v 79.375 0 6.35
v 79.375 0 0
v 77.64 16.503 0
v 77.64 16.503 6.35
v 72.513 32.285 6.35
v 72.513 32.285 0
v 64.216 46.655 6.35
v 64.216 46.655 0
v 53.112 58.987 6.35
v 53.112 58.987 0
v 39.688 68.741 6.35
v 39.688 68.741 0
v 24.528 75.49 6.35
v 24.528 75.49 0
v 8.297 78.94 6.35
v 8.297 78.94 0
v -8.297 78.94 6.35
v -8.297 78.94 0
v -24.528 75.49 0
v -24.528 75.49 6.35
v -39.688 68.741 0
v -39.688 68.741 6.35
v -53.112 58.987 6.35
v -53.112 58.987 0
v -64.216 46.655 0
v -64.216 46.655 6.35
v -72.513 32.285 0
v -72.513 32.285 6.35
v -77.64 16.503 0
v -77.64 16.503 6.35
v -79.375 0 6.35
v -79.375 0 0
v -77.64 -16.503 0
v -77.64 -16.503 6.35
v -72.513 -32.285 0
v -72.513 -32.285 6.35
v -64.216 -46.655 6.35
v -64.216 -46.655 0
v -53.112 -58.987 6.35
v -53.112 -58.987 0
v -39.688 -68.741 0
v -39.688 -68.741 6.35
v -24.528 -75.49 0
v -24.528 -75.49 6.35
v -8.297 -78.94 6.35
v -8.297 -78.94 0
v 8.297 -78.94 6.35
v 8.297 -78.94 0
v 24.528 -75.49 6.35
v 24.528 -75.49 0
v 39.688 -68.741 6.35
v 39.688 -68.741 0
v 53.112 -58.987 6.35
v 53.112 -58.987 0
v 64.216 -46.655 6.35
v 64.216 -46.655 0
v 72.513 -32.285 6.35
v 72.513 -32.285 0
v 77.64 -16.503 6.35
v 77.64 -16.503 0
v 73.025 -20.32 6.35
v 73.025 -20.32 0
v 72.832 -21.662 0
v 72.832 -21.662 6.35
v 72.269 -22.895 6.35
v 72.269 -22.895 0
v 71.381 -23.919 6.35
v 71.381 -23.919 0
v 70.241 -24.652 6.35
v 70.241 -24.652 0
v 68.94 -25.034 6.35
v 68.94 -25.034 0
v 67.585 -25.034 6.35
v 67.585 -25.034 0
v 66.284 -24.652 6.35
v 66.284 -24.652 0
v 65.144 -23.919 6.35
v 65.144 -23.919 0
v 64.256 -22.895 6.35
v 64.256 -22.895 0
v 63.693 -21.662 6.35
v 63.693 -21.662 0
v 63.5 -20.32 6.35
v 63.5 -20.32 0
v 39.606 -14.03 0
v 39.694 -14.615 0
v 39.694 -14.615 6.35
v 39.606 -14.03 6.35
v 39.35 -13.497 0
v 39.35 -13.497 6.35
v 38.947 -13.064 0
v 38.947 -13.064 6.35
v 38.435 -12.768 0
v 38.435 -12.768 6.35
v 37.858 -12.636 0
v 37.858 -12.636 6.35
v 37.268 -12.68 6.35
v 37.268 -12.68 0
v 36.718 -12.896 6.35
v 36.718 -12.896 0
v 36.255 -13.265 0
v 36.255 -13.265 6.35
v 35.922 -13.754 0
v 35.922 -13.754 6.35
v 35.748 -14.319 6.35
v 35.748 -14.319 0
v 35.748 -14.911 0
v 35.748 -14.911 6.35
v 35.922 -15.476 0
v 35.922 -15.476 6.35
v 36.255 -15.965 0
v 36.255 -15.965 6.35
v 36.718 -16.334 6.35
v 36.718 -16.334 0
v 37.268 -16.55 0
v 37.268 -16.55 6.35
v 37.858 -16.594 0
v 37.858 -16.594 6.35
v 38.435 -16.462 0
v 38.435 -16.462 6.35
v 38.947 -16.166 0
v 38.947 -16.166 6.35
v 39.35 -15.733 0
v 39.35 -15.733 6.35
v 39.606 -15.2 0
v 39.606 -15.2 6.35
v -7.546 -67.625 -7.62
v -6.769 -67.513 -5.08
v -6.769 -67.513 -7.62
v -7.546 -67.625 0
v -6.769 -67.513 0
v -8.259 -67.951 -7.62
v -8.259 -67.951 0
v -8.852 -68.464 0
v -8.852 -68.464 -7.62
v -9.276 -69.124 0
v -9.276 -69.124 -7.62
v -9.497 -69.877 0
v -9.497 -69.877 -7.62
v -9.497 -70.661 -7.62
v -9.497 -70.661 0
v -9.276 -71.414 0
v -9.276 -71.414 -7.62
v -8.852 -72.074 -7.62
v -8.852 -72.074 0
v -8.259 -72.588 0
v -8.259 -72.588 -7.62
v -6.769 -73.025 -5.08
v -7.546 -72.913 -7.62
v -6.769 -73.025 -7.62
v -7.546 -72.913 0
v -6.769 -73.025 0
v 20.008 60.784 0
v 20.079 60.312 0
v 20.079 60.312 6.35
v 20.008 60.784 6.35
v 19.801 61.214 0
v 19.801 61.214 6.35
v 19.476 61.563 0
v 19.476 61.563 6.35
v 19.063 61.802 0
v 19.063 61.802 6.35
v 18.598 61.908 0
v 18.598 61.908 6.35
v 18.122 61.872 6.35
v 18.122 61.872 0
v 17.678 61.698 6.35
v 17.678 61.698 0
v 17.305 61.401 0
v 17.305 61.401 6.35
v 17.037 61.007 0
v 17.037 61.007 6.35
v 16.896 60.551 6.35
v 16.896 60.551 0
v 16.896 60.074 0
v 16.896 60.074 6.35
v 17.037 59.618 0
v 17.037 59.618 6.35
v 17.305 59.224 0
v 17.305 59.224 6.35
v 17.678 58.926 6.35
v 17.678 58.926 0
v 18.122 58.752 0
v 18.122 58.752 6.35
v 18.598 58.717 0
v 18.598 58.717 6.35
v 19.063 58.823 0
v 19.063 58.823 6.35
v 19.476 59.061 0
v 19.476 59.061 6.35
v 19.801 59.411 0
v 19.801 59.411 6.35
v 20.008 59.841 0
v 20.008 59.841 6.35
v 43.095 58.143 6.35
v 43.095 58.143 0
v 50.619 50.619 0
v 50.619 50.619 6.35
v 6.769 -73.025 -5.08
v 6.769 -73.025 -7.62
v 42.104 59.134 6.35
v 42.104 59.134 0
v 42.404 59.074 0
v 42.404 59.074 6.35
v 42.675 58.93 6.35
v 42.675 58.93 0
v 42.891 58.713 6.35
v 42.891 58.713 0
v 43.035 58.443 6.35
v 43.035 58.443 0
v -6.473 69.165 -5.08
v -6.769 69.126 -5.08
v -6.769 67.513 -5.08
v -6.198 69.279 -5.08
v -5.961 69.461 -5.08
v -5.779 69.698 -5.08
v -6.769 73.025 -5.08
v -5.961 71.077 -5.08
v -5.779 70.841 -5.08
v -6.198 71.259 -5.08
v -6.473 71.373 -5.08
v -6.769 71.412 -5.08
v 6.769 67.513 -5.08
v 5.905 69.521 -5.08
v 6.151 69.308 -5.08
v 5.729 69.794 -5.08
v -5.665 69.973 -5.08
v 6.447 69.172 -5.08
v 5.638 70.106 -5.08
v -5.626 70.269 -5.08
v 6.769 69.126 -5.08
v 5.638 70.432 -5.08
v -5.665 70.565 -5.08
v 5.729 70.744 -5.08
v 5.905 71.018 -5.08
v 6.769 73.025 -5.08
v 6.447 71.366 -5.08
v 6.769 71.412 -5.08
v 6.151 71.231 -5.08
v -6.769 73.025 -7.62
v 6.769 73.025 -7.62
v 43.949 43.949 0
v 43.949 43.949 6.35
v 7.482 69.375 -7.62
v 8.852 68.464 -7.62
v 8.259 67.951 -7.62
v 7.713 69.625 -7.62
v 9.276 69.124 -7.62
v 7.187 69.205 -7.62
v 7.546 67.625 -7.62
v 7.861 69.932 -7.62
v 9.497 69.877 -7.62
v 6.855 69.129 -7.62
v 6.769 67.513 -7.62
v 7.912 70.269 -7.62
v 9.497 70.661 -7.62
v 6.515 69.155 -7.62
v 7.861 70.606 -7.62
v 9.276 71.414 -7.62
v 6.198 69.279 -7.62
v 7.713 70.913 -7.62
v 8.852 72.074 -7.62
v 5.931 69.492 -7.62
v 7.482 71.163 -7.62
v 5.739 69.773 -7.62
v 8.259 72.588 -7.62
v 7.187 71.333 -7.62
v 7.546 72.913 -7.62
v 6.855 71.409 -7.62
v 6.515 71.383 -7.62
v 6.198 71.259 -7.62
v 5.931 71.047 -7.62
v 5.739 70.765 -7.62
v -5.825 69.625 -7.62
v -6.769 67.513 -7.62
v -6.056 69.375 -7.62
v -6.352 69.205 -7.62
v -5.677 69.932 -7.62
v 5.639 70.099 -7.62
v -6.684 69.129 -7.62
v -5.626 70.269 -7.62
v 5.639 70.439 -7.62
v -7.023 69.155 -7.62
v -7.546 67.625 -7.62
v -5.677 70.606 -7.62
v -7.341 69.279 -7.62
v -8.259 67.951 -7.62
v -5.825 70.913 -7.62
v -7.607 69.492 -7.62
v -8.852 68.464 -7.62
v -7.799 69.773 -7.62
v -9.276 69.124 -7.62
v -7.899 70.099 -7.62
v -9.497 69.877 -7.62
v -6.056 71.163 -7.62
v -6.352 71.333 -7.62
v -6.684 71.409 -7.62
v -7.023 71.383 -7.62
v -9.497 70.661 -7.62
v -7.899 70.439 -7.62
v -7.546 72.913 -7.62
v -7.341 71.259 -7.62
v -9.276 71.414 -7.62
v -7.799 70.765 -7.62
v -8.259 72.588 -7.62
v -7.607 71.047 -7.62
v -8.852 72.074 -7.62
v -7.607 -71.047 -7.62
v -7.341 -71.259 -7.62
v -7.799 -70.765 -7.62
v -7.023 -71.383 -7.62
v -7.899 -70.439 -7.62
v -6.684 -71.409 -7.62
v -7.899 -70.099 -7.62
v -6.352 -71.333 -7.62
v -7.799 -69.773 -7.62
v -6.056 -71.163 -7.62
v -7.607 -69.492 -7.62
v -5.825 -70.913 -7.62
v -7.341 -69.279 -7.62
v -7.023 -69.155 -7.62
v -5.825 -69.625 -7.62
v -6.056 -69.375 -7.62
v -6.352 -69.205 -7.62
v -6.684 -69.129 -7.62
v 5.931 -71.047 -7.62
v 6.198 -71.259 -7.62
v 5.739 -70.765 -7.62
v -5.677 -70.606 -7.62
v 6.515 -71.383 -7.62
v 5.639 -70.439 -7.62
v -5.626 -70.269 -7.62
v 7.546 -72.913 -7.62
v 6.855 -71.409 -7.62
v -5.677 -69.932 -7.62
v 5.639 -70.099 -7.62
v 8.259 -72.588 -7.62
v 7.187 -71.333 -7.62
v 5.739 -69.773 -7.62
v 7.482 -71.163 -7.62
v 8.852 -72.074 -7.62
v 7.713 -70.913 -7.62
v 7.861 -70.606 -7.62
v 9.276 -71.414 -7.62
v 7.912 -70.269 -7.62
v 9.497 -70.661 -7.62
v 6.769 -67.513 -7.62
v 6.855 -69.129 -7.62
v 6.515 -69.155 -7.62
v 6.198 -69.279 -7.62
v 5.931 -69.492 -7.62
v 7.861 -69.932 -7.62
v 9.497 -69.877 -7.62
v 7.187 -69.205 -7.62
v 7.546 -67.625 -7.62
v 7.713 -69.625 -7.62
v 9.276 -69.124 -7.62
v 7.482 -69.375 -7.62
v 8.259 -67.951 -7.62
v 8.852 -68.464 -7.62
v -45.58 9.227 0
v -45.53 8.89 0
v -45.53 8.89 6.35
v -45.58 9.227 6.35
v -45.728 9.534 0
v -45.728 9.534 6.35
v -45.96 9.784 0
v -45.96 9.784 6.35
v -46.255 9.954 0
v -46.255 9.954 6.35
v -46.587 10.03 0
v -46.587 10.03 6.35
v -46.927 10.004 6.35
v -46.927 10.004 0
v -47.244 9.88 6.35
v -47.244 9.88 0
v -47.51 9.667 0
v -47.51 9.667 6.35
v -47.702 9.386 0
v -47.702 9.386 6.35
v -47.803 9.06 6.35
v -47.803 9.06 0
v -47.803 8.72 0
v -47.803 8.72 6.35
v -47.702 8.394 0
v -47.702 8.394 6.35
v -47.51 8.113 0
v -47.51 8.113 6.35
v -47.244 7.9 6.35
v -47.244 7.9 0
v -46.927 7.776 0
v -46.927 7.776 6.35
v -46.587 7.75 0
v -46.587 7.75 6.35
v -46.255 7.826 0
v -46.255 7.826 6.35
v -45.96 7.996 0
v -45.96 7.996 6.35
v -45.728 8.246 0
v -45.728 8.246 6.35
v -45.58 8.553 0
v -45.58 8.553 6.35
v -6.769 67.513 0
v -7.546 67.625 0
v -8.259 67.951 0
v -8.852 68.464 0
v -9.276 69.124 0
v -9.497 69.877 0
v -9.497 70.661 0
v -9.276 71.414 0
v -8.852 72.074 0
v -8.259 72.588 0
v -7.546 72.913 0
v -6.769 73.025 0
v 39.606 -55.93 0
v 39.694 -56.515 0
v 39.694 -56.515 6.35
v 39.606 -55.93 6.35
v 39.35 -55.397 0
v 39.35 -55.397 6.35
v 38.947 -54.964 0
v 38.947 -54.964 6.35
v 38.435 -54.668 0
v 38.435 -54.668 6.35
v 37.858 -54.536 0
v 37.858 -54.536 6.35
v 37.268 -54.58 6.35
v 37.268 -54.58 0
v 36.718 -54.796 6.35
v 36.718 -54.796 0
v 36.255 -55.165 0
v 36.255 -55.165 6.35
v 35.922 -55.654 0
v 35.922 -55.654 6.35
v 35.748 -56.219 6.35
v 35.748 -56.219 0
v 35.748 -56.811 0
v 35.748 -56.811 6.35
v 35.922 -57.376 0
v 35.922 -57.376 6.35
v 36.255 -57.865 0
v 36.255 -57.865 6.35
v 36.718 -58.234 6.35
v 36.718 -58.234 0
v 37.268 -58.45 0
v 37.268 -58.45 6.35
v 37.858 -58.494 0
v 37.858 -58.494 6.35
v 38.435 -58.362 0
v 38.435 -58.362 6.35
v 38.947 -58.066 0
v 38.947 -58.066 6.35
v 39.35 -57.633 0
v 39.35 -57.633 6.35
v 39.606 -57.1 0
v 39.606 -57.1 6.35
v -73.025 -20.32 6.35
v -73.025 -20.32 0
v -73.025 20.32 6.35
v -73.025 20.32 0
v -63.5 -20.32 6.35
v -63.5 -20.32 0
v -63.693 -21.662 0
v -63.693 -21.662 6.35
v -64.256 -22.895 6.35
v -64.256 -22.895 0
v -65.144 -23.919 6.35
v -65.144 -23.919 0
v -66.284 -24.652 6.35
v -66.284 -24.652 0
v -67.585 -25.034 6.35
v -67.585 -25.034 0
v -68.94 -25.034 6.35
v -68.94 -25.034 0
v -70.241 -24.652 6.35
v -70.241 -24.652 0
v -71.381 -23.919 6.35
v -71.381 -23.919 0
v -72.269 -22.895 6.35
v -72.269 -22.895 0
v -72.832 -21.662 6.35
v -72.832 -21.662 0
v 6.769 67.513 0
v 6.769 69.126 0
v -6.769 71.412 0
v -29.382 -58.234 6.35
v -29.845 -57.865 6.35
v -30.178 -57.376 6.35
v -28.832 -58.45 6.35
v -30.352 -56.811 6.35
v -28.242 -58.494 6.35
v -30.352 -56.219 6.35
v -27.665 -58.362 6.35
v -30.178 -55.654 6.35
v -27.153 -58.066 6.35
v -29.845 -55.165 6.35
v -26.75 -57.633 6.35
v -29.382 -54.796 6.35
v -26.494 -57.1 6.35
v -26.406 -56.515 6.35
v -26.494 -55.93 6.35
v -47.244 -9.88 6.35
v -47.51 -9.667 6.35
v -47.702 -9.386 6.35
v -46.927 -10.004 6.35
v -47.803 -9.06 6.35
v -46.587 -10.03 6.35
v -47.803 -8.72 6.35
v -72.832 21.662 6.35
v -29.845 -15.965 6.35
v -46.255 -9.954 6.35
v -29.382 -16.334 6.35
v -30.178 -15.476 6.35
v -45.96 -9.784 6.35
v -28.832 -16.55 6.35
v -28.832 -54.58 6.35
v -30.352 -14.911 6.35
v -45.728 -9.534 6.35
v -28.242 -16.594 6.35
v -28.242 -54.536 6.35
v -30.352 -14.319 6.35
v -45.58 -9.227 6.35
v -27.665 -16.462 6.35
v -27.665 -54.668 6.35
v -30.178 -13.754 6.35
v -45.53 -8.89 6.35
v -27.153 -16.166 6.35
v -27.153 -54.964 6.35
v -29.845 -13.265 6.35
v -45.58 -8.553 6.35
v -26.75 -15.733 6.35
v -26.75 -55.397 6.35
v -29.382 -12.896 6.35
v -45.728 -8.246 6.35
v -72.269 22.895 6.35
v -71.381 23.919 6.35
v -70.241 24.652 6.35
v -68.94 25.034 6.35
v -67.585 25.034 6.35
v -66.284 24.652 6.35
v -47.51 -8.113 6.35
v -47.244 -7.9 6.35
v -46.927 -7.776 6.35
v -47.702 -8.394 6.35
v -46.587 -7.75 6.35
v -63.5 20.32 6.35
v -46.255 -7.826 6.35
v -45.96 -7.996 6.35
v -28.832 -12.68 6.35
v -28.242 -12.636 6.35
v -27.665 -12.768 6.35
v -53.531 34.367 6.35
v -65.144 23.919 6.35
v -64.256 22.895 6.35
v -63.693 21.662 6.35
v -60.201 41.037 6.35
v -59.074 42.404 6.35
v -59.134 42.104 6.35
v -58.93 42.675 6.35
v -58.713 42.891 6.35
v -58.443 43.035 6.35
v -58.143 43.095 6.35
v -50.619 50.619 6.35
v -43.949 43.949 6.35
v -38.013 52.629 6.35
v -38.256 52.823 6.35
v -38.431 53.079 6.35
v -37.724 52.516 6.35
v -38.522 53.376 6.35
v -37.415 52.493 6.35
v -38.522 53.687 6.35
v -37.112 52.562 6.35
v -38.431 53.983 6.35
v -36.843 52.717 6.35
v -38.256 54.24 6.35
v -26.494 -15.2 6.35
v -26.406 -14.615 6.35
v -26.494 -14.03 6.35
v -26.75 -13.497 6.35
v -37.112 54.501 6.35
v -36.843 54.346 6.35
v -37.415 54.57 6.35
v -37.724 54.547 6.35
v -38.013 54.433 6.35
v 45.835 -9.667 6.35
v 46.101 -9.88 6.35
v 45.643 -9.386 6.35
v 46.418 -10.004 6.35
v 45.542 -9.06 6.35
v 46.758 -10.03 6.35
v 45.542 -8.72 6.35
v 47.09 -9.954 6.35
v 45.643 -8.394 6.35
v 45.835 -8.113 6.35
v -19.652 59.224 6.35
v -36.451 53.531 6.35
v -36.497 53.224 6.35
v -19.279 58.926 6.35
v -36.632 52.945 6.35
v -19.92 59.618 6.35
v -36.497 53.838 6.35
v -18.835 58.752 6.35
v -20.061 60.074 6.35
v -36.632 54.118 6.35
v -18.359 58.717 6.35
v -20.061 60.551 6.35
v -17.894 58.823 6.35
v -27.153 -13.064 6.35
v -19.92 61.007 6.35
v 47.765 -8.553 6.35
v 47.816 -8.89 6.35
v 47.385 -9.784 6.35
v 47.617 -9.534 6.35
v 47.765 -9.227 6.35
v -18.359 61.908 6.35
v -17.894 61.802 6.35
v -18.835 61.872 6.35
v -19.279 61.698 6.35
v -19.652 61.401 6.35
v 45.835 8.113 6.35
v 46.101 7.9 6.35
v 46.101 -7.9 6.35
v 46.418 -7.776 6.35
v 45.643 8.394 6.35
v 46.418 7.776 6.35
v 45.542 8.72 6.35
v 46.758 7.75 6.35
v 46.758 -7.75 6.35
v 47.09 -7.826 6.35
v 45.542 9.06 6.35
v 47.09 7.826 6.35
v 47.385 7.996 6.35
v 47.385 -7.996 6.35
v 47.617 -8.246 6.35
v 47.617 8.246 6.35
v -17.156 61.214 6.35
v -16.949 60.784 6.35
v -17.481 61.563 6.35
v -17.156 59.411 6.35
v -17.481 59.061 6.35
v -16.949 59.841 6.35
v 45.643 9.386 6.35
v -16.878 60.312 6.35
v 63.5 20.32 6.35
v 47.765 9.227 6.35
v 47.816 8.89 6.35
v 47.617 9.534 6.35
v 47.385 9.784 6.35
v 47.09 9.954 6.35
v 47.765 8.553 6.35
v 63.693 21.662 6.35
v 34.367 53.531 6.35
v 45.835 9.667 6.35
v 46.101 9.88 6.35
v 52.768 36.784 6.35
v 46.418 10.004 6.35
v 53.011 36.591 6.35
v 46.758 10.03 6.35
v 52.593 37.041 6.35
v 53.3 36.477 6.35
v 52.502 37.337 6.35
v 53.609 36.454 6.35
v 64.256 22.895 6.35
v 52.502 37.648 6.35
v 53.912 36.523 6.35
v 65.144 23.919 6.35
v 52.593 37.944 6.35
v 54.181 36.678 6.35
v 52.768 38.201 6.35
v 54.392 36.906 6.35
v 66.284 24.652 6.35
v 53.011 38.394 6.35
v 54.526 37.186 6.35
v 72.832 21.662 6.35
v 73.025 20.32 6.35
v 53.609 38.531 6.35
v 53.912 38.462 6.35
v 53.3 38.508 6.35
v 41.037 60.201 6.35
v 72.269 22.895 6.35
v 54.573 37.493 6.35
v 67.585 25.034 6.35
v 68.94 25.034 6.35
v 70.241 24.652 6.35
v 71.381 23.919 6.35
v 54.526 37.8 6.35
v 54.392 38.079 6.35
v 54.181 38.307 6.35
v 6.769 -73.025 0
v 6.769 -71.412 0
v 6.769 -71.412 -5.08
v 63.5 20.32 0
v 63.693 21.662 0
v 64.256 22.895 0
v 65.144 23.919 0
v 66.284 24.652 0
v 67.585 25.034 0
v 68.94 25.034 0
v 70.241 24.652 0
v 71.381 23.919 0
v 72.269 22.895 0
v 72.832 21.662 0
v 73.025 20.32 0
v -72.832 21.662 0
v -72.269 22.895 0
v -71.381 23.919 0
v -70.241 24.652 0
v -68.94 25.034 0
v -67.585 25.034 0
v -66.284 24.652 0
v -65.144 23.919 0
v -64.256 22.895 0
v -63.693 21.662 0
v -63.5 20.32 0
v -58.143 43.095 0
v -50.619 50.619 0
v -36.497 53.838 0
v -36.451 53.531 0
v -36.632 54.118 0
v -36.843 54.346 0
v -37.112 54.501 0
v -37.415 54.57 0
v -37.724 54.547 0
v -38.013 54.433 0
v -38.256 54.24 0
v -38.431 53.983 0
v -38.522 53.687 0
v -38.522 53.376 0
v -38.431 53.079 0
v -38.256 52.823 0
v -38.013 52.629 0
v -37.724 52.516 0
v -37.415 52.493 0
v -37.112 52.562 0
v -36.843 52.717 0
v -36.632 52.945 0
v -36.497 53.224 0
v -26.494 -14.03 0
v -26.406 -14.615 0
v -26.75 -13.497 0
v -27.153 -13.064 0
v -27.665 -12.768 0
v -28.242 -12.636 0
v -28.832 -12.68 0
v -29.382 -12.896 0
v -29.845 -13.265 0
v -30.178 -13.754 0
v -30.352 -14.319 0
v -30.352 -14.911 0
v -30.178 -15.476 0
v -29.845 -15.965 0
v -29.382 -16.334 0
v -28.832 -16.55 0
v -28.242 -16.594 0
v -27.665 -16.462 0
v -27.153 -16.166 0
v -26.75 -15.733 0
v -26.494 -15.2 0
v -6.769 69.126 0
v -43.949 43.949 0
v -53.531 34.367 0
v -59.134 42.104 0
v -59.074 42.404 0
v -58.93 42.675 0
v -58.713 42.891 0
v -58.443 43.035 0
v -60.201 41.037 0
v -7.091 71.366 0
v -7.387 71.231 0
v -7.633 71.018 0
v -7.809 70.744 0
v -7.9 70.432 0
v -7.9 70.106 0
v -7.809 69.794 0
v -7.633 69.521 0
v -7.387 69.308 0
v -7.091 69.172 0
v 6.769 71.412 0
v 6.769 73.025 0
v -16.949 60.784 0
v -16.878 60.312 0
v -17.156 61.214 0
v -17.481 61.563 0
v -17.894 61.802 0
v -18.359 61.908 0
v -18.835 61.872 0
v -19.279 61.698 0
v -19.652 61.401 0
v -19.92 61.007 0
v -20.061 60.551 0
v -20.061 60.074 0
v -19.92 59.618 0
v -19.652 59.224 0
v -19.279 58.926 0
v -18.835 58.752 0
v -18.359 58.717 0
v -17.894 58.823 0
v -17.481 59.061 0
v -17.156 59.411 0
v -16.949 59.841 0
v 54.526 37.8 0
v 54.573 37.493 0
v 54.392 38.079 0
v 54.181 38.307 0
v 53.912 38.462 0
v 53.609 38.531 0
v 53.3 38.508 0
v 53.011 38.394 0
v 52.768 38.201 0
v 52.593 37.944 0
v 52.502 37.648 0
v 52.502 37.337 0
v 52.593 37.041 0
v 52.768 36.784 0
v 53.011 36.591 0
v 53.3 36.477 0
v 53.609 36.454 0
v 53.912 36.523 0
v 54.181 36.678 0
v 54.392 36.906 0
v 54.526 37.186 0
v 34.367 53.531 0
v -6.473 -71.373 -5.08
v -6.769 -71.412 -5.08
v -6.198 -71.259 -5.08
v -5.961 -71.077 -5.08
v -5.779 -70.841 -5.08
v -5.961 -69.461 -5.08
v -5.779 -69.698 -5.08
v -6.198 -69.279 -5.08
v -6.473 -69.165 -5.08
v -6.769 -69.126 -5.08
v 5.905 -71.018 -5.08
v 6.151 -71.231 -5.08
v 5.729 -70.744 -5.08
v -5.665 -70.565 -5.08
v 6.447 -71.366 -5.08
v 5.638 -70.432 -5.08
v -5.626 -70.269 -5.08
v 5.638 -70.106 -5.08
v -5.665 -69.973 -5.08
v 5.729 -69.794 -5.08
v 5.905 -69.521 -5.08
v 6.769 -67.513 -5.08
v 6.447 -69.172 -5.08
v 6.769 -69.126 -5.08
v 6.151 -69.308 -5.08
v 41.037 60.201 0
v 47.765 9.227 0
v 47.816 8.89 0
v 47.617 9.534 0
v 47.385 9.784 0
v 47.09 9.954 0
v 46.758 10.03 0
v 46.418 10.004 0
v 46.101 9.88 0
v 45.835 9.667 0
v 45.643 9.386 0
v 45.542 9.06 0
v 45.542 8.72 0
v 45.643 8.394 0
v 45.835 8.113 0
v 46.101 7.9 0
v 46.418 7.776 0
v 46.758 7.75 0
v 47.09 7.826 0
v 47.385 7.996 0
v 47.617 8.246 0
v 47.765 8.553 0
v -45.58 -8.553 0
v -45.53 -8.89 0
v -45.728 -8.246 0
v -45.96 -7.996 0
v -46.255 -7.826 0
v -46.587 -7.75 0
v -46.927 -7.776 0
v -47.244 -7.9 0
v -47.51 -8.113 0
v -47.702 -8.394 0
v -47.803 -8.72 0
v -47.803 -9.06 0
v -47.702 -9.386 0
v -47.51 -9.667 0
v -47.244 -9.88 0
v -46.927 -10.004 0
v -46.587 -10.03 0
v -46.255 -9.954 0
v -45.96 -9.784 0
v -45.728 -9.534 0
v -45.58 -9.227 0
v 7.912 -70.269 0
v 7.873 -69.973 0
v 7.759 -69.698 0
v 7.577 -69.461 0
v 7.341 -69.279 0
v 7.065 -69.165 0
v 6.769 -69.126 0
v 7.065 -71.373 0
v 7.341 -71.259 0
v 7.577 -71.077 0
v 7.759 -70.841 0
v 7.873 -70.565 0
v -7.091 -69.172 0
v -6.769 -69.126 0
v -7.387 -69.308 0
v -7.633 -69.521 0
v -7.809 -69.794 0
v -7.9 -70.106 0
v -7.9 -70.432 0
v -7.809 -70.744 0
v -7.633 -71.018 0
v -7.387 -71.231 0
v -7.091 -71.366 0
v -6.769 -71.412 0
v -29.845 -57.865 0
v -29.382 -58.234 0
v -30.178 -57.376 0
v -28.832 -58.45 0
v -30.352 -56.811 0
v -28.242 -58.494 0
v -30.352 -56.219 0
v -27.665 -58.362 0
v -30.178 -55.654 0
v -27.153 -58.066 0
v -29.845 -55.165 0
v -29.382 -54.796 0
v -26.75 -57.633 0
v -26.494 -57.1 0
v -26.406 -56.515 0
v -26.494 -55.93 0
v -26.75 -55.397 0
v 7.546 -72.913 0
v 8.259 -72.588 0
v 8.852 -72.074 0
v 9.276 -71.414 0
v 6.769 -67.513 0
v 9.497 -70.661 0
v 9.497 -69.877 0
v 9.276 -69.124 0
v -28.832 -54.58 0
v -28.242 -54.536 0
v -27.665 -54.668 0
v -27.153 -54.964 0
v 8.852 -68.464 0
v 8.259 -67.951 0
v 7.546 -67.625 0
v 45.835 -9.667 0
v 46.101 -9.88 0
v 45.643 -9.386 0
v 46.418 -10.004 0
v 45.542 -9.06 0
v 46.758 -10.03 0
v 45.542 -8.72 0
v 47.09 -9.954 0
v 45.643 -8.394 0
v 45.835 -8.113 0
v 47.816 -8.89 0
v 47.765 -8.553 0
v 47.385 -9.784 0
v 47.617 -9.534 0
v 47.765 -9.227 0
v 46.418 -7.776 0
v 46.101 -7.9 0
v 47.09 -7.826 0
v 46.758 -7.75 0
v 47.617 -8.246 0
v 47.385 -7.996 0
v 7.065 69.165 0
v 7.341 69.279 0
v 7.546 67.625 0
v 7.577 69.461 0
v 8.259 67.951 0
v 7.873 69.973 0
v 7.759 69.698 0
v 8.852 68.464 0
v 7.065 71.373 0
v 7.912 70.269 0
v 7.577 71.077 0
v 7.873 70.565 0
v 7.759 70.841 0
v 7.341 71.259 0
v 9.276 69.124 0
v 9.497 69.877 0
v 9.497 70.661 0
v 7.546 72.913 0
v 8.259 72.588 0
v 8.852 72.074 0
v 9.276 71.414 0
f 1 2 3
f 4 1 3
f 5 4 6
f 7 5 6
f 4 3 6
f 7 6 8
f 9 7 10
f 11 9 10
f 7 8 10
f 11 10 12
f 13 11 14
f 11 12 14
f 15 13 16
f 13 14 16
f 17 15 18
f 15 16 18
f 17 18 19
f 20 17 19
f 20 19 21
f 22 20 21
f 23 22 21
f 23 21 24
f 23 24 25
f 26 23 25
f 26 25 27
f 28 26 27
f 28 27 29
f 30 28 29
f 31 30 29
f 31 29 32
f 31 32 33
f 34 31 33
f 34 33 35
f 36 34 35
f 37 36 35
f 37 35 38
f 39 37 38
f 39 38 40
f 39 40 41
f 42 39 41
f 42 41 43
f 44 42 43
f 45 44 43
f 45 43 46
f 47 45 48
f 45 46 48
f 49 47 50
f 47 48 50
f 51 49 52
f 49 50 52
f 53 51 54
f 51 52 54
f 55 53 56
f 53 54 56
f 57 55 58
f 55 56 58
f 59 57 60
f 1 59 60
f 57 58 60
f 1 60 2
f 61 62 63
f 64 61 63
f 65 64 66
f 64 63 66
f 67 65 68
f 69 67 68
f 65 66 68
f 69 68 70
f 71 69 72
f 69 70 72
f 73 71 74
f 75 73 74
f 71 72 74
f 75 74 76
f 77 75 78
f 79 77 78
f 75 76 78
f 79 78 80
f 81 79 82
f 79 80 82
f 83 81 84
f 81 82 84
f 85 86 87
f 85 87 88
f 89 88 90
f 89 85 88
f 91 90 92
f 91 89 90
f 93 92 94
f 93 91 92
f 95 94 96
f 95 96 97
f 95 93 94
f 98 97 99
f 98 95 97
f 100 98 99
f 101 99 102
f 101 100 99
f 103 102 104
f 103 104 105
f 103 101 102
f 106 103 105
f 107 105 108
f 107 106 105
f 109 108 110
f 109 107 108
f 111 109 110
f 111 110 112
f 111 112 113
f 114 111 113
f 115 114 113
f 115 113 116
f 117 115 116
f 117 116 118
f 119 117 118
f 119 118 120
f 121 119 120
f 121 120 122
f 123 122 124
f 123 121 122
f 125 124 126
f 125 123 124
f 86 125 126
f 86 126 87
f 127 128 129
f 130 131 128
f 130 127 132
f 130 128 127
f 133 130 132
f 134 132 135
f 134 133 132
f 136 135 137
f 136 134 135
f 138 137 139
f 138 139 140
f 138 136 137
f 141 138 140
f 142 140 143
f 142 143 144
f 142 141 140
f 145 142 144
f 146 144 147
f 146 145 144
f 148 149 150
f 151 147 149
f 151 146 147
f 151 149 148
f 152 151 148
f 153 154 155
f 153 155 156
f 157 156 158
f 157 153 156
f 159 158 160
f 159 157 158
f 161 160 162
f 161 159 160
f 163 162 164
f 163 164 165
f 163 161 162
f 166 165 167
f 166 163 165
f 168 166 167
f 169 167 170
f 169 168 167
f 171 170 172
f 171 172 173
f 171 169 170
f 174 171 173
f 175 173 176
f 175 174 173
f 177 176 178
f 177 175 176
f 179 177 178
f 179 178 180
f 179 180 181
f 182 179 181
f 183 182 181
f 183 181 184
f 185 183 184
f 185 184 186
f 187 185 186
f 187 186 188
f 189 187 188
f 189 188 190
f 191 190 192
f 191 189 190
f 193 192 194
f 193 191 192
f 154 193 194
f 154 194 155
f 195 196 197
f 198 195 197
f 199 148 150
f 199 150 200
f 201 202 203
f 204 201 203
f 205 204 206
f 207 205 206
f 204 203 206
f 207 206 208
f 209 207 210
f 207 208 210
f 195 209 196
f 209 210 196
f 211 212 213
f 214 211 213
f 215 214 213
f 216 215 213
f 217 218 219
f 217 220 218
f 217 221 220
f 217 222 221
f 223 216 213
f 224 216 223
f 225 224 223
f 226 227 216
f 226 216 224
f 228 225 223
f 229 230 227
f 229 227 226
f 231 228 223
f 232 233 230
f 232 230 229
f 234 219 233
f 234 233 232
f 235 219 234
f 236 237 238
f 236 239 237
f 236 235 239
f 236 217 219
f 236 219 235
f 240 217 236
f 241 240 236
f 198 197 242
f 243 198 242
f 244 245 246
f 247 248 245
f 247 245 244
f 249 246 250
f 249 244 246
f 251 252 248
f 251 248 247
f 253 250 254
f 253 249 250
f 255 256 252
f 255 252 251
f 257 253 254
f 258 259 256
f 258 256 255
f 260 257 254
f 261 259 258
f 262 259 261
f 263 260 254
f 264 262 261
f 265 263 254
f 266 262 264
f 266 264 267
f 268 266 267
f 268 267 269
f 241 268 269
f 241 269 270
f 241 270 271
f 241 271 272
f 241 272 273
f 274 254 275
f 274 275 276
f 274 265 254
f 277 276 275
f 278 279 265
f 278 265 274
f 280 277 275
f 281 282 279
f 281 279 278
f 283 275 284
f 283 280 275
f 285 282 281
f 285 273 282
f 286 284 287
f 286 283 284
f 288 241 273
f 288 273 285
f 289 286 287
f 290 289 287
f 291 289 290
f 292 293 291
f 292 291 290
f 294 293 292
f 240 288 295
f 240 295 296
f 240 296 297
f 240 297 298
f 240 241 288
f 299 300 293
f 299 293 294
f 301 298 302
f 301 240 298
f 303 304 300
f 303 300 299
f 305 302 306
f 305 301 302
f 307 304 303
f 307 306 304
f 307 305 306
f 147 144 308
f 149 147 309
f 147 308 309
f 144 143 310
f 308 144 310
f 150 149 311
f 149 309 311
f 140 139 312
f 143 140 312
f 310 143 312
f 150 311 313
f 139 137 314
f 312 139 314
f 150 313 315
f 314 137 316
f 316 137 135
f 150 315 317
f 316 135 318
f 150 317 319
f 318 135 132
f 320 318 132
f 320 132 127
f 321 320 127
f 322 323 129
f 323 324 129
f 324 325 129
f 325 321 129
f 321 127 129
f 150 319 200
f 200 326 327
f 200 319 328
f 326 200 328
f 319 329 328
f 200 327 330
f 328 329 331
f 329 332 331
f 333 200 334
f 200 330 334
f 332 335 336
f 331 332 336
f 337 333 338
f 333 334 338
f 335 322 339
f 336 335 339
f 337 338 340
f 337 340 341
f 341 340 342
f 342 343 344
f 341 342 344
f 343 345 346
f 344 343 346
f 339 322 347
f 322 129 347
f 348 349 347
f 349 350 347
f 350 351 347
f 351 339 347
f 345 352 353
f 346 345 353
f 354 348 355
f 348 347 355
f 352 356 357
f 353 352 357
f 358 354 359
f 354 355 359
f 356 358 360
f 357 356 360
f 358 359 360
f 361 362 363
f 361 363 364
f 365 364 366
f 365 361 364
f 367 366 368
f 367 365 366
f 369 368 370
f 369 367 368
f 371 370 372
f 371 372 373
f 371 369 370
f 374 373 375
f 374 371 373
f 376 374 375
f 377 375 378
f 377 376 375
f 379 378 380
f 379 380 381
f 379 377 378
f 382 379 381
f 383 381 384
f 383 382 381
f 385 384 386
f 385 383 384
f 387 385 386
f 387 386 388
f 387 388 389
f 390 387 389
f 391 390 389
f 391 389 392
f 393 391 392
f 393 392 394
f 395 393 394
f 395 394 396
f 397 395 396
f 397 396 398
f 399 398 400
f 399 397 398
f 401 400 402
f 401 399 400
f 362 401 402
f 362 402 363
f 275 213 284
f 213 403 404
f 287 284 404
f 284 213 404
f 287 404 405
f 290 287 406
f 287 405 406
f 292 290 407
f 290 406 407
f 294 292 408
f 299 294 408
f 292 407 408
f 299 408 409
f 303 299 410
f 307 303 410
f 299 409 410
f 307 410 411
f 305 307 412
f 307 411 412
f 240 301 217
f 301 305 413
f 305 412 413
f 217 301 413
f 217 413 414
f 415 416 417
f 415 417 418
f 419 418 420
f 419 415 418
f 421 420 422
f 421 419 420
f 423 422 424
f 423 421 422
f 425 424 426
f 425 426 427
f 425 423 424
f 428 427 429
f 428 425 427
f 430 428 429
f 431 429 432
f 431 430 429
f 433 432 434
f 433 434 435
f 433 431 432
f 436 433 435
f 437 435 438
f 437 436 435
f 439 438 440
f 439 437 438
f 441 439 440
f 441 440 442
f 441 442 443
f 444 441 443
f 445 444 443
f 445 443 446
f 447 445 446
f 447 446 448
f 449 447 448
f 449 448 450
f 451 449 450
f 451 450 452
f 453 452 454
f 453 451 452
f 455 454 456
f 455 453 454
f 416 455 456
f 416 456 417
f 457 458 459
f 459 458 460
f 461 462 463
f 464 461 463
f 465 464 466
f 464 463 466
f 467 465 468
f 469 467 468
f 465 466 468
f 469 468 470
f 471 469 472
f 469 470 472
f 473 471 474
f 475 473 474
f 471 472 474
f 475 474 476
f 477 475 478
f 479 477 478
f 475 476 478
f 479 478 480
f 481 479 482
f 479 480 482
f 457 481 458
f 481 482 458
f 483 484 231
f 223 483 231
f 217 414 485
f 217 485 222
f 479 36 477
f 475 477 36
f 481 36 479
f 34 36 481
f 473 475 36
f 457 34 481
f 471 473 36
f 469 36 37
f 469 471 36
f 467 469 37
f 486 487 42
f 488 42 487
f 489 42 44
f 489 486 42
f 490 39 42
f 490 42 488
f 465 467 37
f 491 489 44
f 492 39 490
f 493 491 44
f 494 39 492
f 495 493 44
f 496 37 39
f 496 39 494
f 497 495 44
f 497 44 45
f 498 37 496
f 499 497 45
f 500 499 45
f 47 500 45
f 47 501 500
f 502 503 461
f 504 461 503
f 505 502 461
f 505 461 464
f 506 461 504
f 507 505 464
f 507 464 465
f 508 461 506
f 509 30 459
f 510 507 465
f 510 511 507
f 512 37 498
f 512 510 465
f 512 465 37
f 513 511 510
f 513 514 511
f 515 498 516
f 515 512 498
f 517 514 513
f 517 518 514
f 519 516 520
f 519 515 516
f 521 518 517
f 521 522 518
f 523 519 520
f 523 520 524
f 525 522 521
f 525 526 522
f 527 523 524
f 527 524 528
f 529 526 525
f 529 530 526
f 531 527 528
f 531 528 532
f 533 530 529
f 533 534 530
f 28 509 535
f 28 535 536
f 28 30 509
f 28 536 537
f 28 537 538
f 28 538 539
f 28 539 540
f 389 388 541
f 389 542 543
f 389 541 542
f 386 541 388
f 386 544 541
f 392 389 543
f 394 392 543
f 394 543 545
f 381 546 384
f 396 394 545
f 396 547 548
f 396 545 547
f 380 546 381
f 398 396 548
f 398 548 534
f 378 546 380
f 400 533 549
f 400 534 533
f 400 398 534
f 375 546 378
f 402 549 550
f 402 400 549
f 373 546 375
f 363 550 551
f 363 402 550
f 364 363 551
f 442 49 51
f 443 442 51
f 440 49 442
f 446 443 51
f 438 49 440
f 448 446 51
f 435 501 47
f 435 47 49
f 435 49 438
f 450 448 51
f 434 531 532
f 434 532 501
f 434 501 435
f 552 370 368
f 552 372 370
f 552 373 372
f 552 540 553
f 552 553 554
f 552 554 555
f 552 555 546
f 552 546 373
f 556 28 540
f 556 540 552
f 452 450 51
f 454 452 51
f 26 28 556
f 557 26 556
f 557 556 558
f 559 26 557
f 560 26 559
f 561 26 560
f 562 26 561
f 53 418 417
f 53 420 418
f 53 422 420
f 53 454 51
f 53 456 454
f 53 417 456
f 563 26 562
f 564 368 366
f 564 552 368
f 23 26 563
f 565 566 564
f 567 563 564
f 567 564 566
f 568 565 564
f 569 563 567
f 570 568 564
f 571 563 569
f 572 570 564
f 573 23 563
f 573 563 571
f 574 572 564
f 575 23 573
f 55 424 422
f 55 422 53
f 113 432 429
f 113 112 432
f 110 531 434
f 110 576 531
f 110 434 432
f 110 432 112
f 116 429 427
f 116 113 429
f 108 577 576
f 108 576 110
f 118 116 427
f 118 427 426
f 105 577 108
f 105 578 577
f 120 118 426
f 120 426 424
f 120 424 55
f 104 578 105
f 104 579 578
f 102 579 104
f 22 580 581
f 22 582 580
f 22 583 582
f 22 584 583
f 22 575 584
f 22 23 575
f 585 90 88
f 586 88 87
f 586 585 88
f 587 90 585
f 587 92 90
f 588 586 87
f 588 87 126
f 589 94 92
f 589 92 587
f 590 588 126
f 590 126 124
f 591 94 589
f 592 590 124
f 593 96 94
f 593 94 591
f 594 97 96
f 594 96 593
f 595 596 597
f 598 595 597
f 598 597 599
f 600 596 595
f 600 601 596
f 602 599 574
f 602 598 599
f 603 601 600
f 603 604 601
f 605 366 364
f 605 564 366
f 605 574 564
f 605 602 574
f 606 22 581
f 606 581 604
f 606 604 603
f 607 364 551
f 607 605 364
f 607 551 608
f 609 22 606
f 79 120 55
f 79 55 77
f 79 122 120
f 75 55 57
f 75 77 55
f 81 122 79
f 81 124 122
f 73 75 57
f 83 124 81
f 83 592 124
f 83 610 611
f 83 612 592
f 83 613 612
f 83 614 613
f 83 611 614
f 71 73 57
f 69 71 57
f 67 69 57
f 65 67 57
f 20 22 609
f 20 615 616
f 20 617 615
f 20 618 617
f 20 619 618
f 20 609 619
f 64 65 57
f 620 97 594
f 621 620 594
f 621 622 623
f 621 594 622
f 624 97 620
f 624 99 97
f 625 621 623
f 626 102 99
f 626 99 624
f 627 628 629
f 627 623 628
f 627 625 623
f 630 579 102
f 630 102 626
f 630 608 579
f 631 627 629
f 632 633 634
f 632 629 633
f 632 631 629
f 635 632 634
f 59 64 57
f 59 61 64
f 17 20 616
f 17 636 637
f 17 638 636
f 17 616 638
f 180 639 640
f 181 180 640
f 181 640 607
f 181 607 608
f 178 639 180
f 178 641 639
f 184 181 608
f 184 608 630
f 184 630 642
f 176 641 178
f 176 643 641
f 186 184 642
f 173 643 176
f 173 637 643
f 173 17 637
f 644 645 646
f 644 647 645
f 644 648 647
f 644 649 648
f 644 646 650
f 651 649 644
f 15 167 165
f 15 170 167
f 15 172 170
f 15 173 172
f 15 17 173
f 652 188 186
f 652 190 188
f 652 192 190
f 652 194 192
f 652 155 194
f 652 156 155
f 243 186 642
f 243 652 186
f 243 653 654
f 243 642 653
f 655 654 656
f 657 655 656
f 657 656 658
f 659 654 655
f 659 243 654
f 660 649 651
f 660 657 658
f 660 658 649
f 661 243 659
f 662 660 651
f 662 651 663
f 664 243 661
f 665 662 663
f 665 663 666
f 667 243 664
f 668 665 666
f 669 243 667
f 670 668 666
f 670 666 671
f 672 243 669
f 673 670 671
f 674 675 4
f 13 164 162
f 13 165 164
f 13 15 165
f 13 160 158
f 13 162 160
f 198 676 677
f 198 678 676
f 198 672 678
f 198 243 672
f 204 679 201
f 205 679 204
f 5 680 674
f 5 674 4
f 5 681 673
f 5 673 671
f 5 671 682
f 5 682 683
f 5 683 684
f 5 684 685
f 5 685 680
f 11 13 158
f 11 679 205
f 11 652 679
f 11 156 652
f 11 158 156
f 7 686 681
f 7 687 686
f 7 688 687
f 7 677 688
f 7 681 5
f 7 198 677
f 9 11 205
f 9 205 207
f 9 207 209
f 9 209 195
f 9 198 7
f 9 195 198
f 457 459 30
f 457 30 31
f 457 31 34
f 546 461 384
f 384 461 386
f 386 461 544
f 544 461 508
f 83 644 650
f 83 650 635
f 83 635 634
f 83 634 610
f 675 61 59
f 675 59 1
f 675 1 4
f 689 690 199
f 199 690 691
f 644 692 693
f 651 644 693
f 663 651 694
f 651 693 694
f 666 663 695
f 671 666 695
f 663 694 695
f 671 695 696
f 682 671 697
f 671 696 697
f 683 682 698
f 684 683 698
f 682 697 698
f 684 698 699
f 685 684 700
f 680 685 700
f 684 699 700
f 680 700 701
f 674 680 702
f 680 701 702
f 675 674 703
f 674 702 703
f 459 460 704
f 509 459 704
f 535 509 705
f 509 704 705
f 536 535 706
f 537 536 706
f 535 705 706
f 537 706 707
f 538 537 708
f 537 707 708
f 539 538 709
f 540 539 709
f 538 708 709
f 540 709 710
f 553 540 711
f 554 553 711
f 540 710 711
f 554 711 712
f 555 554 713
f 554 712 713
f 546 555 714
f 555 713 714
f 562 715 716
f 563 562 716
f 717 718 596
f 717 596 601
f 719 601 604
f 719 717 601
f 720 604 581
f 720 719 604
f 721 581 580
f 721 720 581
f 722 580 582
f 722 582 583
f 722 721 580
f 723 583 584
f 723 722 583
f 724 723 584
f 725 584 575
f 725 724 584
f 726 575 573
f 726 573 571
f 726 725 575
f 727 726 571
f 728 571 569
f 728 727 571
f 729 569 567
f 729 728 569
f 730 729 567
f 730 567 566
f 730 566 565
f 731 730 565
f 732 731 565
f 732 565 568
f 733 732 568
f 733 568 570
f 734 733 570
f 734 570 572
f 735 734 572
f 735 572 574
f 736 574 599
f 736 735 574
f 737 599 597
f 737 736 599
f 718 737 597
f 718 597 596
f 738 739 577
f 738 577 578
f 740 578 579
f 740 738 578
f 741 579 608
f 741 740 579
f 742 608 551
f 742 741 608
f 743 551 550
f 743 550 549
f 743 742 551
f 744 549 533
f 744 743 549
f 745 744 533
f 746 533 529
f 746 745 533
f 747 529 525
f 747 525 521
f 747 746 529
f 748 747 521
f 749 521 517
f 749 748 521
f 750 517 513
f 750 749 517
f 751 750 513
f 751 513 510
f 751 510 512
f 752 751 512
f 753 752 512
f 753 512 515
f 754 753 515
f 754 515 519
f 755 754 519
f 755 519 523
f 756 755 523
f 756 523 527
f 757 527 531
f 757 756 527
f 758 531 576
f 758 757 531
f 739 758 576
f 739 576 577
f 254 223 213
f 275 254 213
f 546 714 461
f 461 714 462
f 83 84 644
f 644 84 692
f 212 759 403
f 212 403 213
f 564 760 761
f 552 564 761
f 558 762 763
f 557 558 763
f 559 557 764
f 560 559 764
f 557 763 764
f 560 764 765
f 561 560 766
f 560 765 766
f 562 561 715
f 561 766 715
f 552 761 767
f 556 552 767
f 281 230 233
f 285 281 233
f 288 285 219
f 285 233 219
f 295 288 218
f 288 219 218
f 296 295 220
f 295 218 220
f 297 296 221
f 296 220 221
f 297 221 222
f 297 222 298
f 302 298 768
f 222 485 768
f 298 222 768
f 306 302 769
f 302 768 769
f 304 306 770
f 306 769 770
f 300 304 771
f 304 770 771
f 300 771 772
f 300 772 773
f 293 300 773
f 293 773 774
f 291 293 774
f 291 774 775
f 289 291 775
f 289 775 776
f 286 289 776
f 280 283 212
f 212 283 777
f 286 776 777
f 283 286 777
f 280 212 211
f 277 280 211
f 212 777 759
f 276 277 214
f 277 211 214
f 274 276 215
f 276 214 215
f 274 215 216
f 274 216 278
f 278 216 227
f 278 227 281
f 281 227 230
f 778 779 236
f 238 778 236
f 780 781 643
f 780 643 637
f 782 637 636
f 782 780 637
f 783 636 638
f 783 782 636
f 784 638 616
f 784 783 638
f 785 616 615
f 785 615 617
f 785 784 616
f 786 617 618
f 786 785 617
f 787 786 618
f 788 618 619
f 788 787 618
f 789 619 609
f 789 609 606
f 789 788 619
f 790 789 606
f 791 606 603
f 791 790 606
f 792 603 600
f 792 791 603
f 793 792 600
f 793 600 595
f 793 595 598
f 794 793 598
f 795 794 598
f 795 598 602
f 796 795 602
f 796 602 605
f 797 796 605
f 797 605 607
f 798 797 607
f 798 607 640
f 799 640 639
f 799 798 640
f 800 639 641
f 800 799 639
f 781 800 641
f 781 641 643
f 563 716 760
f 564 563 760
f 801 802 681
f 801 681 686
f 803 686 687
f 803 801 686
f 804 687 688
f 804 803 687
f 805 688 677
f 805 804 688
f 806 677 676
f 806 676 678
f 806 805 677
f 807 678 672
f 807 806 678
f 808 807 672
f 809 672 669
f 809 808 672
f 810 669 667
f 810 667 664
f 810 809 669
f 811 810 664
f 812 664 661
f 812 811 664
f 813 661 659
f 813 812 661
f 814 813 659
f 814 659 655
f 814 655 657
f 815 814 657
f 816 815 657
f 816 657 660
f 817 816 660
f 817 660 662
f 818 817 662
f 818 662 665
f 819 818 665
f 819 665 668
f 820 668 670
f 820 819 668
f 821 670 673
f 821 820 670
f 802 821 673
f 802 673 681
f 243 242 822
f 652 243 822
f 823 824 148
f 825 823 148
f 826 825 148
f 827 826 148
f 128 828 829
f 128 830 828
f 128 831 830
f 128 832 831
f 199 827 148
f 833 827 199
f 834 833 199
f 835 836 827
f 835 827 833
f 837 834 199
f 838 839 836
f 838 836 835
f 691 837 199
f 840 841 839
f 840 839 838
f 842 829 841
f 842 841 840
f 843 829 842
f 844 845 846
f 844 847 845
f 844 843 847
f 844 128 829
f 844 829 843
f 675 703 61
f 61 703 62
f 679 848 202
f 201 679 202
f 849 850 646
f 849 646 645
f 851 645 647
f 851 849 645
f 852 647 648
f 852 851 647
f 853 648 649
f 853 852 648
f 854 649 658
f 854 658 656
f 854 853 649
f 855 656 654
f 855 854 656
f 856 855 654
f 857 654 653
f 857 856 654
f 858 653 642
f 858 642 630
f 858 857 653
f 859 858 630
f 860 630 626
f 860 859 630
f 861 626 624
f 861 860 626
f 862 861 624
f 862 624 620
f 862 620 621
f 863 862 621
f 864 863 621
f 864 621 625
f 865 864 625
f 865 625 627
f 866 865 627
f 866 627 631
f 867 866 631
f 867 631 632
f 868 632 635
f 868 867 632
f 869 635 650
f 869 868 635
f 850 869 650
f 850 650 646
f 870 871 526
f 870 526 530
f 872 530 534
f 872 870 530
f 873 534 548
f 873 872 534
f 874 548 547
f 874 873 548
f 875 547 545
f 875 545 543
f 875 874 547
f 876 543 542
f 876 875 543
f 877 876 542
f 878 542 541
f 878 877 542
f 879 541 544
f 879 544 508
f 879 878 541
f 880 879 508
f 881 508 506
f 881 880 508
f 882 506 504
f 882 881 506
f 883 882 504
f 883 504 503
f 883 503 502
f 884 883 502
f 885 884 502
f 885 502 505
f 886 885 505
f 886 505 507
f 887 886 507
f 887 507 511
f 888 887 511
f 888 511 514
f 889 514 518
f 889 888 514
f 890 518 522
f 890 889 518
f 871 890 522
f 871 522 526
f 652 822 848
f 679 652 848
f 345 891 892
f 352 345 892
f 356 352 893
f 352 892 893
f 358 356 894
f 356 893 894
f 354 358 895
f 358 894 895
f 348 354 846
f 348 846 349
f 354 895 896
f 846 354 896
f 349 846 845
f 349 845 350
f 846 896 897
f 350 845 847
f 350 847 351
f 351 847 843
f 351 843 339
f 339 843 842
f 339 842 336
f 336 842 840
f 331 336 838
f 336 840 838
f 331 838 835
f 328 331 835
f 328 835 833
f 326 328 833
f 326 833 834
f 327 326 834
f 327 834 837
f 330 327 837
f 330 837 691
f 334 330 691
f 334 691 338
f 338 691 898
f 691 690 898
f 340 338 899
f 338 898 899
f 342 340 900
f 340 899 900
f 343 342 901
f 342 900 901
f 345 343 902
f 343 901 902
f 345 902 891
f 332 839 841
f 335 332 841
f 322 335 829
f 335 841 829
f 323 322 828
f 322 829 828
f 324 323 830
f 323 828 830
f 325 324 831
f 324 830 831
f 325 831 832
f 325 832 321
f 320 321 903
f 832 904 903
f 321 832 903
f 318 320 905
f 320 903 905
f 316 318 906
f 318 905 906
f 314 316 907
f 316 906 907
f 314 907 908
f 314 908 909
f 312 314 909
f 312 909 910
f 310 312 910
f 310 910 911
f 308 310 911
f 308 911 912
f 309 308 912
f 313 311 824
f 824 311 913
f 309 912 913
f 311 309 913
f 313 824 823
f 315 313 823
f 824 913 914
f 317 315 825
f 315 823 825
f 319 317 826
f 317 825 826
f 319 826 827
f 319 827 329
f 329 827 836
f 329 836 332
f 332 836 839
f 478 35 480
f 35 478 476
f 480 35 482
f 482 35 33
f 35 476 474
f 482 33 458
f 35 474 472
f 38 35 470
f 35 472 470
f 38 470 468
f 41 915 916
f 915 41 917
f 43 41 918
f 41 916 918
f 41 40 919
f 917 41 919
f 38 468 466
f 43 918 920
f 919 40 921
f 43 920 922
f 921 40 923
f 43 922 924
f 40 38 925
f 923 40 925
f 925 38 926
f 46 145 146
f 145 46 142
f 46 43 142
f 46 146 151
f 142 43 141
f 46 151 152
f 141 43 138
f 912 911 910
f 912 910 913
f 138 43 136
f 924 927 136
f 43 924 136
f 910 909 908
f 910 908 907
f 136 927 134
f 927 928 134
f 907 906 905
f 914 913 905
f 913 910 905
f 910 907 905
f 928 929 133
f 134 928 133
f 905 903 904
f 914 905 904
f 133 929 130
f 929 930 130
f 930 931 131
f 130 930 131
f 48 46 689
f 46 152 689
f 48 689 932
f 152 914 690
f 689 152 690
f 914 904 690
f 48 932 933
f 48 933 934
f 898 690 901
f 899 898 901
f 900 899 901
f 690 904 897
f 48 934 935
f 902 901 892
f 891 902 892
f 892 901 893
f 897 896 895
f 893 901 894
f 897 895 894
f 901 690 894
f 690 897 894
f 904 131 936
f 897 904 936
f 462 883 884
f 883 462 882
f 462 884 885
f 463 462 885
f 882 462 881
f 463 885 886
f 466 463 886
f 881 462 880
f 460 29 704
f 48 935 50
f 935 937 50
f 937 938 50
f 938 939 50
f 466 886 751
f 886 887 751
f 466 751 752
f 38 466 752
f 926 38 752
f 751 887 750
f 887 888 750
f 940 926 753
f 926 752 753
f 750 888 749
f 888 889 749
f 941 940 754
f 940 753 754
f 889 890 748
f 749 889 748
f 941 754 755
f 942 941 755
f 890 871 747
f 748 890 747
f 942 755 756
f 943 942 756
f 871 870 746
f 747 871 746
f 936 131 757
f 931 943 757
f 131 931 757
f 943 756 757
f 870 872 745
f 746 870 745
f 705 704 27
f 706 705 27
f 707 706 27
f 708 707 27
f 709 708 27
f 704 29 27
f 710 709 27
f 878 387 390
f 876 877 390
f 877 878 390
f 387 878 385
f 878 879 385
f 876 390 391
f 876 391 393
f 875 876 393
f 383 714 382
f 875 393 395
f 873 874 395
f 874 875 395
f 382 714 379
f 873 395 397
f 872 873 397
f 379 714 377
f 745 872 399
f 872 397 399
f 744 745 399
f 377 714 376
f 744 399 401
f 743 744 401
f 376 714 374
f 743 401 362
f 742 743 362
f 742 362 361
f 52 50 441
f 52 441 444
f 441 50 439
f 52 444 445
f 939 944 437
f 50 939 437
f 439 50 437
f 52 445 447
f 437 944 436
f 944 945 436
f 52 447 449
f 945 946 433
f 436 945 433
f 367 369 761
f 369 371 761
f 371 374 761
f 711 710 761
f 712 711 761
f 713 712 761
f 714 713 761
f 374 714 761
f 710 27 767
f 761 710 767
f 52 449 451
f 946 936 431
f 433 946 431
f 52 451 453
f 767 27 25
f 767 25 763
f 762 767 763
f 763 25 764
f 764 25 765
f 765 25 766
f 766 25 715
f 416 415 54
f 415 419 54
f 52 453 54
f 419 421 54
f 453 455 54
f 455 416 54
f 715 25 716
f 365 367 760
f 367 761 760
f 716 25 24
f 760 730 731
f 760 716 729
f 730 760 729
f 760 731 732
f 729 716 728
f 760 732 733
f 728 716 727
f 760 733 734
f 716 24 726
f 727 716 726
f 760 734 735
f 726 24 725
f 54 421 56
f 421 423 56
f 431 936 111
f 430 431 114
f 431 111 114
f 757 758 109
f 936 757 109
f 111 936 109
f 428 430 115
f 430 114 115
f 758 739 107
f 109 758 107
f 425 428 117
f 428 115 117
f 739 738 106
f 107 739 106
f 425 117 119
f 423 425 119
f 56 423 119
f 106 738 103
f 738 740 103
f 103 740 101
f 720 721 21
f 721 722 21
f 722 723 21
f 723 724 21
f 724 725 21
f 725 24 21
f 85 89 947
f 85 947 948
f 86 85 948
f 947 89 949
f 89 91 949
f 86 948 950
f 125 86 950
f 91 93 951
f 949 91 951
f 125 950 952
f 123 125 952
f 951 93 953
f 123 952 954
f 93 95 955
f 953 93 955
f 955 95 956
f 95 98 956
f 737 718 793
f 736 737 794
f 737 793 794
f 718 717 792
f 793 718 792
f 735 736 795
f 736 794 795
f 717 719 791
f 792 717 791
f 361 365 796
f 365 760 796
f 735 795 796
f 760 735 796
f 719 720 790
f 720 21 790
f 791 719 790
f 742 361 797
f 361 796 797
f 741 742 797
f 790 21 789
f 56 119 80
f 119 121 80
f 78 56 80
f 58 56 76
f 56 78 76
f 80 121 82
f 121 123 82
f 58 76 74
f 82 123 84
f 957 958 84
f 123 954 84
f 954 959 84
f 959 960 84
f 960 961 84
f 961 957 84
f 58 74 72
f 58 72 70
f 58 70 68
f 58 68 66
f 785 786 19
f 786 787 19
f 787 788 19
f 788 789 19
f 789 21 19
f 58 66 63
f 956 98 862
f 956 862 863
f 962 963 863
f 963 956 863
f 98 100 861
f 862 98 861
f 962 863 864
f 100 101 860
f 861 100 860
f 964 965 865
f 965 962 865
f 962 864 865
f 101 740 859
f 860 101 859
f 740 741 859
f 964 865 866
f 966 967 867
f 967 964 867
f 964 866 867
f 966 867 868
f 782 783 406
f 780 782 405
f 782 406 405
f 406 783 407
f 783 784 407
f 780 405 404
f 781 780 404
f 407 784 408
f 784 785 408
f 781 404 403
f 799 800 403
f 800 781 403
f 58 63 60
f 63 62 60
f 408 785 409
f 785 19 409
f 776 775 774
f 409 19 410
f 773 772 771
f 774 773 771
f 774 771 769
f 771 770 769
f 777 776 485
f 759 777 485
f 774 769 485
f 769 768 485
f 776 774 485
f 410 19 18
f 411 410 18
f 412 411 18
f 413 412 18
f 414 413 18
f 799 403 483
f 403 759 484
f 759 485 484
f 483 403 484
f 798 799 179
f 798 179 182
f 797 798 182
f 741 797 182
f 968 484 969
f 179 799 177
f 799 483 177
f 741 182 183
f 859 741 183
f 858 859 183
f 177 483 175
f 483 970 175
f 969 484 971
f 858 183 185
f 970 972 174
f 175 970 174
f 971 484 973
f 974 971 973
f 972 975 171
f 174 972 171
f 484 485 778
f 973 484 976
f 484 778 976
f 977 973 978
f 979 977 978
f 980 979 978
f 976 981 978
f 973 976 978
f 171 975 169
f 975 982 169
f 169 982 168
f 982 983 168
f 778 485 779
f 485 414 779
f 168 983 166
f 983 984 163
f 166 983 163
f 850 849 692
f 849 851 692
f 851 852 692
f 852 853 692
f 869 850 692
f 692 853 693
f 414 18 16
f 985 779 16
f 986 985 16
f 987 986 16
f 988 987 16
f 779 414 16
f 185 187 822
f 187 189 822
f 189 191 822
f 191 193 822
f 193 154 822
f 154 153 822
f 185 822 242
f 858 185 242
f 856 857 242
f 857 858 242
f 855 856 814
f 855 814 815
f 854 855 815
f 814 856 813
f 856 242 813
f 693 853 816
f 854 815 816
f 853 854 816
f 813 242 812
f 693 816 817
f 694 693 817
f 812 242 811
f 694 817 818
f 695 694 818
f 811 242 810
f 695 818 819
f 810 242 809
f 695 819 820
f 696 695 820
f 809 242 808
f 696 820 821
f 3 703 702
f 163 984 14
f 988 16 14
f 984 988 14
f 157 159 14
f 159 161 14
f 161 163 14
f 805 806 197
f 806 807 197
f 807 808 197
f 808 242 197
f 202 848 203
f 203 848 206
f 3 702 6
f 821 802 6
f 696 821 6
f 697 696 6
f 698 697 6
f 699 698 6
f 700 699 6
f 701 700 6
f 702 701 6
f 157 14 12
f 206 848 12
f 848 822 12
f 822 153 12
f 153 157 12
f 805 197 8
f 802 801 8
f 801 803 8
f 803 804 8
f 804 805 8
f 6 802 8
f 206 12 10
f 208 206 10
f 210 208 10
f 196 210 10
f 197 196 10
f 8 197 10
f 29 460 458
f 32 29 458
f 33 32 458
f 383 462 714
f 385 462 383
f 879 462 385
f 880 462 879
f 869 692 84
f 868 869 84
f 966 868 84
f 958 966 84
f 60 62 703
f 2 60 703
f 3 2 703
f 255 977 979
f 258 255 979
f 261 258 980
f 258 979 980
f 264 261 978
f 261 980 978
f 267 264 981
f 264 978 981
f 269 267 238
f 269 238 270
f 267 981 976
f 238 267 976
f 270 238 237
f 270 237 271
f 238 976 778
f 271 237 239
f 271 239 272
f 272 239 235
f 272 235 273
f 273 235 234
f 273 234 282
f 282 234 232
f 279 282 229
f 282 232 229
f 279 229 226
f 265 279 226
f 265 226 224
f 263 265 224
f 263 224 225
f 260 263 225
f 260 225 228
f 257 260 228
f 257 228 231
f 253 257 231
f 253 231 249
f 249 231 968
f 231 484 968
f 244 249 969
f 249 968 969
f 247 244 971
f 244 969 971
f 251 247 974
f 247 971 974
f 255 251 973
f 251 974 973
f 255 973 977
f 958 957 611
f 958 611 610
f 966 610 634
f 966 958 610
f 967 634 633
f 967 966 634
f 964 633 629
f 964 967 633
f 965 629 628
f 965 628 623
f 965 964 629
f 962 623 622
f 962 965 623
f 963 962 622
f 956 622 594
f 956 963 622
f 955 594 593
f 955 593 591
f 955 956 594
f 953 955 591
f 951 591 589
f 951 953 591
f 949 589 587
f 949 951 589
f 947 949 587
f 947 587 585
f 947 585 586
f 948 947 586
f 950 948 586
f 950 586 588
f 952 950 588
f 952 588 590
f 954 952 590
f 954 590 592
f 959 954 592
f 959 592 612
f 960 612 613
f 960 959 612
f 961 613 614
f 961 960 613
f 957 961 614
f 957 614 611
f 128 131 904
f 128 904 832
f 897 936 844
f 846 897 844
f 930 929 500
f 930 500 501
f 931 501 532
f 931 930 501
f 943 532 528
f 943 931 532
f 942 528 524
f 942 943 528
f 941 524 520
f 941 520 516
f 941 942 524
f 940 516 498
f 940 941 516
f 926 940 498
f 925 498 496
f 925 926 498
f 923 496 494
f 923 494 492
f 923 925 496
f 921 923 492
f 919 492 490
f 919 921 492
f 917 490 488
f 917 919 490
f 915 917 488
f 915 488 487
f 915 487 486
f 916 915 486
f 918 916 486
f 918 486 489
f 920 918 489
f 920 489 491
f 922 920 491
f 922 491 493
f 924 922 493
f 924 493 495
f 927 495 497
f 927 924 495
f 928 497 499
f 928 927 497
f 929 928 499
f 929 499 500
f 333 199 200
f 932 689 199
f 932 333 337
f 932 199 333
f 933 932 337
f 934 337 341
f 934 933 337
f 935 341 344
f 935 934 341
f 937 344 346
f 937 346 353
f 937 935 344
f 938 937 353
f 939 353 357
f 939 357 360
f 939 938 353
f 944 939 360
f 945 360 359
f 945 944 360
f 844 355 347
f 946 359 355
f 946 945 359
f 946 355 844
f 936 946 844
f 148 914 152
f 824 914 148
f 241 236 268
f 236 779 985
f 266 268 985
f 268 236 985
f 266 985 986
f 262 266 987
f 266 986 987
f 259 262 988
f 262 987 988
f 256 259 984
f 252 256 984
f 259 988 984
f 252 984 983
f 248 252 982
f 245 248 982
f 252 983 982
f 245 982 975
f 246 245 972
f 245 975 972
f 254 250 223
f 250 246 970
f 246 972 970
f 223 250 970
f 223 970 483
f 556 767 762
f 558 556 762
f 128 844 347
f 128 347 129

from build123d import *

# Parameters (mm, degrees)
MASTER_R            = 79.375
MASTER_R_2          = 1.984375
MASTER_R_3          = 1.143
MASTER_R_4          = 1.0414
MASTER_R_5          = 1.6002
BOSS_EXTRUDE1_DEPTH = 6.35
SKETCH11_R          = 1.143
BOSS_EXTRUDE3_DEPTH = 7.62
SKETCH13_W          = 13.5382
SKETCH13_H          = 5.08
CUT_EXTRUDE1_DEPTH  = 173.000625072


with BuildPart() as part:
    # Master → Boss-Extrude1 (new body)
    with BuildSketch(Plane.XY):
        Circle(MASTER_R)
        with Locations((-28.39, -56.515)):
            Circle(MASTER_R_2, mode=Mode.SUBTRACT)
        with BuildLine():
            ThreePointArc((-73.025, 20.32), (-68.2625, 25.0825), (-63.5, 20.32))
            Line((-63.5, 20.32), (-63.5, -20.32))
            ThreePointArc((-63.5, -20.32), (-68.2625, -25.0825), (-73.025, -20.32))
            Line((-73.025, -20.32), (-73.025, 20.32))
        make_face(mode=Mode.SUBTRACT)
        with Locations((-46.6725, -8.89)):
            Circle(MASTER_R_3, mode=Mode.SUBTRACT)
        with Locations((-28.39, -14.615)):
            Circle(MASTER_R_2, mode=Mode.SUBTRACT)
        with Locations((37.71, -56.515)):
            Circle(MASTER_R_2, mode=Mode.SUBTRACT)
        with Locations((37.71, -14.615)):
            Circle(MASTER_R_2, mode=Mode.SUBTRACT)
        with Locations((46.6725, -8.89)):
            Circle(MASTER_R_3, mode=Mode.SUBTRACT)
        with BuildLine():
            Line((63.5, -20.32), (63.5, 20.32))
            ThreePointArc((63.5, 20.32), (68.2625, 25.0825), (73.025, 20.32))
            Line((73.025, 20.32), (73.025, -20.32))
            ThreePointArc((73.025, -20.32), (68.2625, -25.0825), (63.5, -20.32))
        make_face(mode=Mode.SUBTRACT)
        with Locations((-46.6725, 8.89)):
            Circle(MASTER_R_3, mode=Mode.SUBTRACT)
        with BuildLine():
            Line((-43.949373457, 43.949373457), (-53.531306738, 34.367440175))
            Line((-53.531306738, 34.367440175), (-60.200586388, 41.036719826))
            Line((-60.200586388, 41.036719826), (-59.13351137, 42.103794844))
            ThreePointArc((-59.13351137, 42.103794844), (-58.829657849, 42.790920417), (-58.142532276, 43.094773938))
            Line((-58.142532276, 43.094773938), (-50.618653107, 50.618653107))
            Line((-50.618653107, 50.618653107), (-43.949373457, 43.949373457))
        make_face(mode=Mode.SUBTRACT)
        with Locations((-37.492569305, 53.531306738)):
            Circle(MASTER_R_4, mode=Mode.SUBTRACT)
        with Locations((-18.478499634, 60.3123)):
            Circle(MASTER_R_5, mode=Mode.SUBTRACT)
        with Locations((46.6725, 8.89)):
            Circle(MASTER_R_3, mode=Mode.SUBTRACT)
        with Locations((53.531306738, 37.492569305)):
            Circle(MASTER_R_4, mode=Mode.SUBTRACT)
        with Locations((18.478500366, 60.3123)):
            Circle(MASTER_R_5, mode=Mode.SUBTRACT)
        with BuildLine():
            Line((43.949373457, 43.949373457), (34.367440175, 53.531306738))
            Line((34.367440175, 53.531306738), (41.036719826, 60.200586388))
            Line((41.036719826, 60.200586388), (42.103794844, 59.13351137))
            ThreePointArc((42.103794844, 59.13351137), (42.790920417, 58.829657849), (43.094773938, 58.142532276))
            Line((43.094773938, 58.142532276), (50.618653107, 50.618653107))
            Line((50.618653107, 50.618653107), (43.949373457, 43.949373457))
        make_face(mode=Mode.SUBTRACT)
    extrude(amount=BOSS_EXTRUDE1_DEPTH)

    # Sketch11 → Boss-Extrude3 (add)
    # profile 1 of 2: a face of its own
    with BuildSketch(Plane.XY):
        with BuildLine():
            Line((6.7691, 67.5132), (-6.7691, 67.5132))
            ThreePointArc((-6.7691, 67.5132), (-9.525, 70.2691), (-6.7691, 73.025))
            Line((-6.7691, 73.025), (6.7691, 73.025))
            ThreePointArc((6.7691, 73.025), (9.525, 70.2691), (6.7691, 67.5132))
        make_face()
        with Locations((-6.7691, 70.2691)):
            Circle(SKETCH11_R, mode=Mode.SUBTRACT)
        with Locations((6.7691, 70.2691)):
            Circle(SKETCH11_R, mode=Mode.SUBTRACT)
    # profile 2 of 2: a face of its own
    with BuildSketch(Plane.XY):
        with BuildLine():
            Line((6.7691, -67.5132), (-6.7691, -67.5132))
            ThreePointArc((-6.7691, -67.5132), (-9.525, -70.2691), (-6.7691, -73.025))
            Line((-6.7691, -73.025), (6.7691, -73.025))
            ThreePointArc((6.7691, -73.025), (9.525, -70.2691), (6.7691, -67.5132))
        make_face()
        with Locations((6.7691, -70.2691)):
            Circle(SKETCH11_R, mode=Mode.SUBTRACT)
        with Locations((-6.7691, -70.2691)):
            Circle(SKETCH11_R, mode=Mode.SUBTRACT)
    extrude(amount=-BOSS_EXTRUDE3_DEPTH)

    # Sketch13 → Cut-Extrude1 (cut, through all)
    with BuildSketch(Plane(origin=(0, 73.025, 0), x_dir=(1, 0, 0), z_dir=(0, 1, 0))):
        with Locations((0, 2.54)):
            Rectangle(SKETCH13_W, SKETCH13_H)
    extrude(amount=-CUT_EXTRUDE1_DEPTH, mode=Mode.SUBTRACT)


solid = part.part
